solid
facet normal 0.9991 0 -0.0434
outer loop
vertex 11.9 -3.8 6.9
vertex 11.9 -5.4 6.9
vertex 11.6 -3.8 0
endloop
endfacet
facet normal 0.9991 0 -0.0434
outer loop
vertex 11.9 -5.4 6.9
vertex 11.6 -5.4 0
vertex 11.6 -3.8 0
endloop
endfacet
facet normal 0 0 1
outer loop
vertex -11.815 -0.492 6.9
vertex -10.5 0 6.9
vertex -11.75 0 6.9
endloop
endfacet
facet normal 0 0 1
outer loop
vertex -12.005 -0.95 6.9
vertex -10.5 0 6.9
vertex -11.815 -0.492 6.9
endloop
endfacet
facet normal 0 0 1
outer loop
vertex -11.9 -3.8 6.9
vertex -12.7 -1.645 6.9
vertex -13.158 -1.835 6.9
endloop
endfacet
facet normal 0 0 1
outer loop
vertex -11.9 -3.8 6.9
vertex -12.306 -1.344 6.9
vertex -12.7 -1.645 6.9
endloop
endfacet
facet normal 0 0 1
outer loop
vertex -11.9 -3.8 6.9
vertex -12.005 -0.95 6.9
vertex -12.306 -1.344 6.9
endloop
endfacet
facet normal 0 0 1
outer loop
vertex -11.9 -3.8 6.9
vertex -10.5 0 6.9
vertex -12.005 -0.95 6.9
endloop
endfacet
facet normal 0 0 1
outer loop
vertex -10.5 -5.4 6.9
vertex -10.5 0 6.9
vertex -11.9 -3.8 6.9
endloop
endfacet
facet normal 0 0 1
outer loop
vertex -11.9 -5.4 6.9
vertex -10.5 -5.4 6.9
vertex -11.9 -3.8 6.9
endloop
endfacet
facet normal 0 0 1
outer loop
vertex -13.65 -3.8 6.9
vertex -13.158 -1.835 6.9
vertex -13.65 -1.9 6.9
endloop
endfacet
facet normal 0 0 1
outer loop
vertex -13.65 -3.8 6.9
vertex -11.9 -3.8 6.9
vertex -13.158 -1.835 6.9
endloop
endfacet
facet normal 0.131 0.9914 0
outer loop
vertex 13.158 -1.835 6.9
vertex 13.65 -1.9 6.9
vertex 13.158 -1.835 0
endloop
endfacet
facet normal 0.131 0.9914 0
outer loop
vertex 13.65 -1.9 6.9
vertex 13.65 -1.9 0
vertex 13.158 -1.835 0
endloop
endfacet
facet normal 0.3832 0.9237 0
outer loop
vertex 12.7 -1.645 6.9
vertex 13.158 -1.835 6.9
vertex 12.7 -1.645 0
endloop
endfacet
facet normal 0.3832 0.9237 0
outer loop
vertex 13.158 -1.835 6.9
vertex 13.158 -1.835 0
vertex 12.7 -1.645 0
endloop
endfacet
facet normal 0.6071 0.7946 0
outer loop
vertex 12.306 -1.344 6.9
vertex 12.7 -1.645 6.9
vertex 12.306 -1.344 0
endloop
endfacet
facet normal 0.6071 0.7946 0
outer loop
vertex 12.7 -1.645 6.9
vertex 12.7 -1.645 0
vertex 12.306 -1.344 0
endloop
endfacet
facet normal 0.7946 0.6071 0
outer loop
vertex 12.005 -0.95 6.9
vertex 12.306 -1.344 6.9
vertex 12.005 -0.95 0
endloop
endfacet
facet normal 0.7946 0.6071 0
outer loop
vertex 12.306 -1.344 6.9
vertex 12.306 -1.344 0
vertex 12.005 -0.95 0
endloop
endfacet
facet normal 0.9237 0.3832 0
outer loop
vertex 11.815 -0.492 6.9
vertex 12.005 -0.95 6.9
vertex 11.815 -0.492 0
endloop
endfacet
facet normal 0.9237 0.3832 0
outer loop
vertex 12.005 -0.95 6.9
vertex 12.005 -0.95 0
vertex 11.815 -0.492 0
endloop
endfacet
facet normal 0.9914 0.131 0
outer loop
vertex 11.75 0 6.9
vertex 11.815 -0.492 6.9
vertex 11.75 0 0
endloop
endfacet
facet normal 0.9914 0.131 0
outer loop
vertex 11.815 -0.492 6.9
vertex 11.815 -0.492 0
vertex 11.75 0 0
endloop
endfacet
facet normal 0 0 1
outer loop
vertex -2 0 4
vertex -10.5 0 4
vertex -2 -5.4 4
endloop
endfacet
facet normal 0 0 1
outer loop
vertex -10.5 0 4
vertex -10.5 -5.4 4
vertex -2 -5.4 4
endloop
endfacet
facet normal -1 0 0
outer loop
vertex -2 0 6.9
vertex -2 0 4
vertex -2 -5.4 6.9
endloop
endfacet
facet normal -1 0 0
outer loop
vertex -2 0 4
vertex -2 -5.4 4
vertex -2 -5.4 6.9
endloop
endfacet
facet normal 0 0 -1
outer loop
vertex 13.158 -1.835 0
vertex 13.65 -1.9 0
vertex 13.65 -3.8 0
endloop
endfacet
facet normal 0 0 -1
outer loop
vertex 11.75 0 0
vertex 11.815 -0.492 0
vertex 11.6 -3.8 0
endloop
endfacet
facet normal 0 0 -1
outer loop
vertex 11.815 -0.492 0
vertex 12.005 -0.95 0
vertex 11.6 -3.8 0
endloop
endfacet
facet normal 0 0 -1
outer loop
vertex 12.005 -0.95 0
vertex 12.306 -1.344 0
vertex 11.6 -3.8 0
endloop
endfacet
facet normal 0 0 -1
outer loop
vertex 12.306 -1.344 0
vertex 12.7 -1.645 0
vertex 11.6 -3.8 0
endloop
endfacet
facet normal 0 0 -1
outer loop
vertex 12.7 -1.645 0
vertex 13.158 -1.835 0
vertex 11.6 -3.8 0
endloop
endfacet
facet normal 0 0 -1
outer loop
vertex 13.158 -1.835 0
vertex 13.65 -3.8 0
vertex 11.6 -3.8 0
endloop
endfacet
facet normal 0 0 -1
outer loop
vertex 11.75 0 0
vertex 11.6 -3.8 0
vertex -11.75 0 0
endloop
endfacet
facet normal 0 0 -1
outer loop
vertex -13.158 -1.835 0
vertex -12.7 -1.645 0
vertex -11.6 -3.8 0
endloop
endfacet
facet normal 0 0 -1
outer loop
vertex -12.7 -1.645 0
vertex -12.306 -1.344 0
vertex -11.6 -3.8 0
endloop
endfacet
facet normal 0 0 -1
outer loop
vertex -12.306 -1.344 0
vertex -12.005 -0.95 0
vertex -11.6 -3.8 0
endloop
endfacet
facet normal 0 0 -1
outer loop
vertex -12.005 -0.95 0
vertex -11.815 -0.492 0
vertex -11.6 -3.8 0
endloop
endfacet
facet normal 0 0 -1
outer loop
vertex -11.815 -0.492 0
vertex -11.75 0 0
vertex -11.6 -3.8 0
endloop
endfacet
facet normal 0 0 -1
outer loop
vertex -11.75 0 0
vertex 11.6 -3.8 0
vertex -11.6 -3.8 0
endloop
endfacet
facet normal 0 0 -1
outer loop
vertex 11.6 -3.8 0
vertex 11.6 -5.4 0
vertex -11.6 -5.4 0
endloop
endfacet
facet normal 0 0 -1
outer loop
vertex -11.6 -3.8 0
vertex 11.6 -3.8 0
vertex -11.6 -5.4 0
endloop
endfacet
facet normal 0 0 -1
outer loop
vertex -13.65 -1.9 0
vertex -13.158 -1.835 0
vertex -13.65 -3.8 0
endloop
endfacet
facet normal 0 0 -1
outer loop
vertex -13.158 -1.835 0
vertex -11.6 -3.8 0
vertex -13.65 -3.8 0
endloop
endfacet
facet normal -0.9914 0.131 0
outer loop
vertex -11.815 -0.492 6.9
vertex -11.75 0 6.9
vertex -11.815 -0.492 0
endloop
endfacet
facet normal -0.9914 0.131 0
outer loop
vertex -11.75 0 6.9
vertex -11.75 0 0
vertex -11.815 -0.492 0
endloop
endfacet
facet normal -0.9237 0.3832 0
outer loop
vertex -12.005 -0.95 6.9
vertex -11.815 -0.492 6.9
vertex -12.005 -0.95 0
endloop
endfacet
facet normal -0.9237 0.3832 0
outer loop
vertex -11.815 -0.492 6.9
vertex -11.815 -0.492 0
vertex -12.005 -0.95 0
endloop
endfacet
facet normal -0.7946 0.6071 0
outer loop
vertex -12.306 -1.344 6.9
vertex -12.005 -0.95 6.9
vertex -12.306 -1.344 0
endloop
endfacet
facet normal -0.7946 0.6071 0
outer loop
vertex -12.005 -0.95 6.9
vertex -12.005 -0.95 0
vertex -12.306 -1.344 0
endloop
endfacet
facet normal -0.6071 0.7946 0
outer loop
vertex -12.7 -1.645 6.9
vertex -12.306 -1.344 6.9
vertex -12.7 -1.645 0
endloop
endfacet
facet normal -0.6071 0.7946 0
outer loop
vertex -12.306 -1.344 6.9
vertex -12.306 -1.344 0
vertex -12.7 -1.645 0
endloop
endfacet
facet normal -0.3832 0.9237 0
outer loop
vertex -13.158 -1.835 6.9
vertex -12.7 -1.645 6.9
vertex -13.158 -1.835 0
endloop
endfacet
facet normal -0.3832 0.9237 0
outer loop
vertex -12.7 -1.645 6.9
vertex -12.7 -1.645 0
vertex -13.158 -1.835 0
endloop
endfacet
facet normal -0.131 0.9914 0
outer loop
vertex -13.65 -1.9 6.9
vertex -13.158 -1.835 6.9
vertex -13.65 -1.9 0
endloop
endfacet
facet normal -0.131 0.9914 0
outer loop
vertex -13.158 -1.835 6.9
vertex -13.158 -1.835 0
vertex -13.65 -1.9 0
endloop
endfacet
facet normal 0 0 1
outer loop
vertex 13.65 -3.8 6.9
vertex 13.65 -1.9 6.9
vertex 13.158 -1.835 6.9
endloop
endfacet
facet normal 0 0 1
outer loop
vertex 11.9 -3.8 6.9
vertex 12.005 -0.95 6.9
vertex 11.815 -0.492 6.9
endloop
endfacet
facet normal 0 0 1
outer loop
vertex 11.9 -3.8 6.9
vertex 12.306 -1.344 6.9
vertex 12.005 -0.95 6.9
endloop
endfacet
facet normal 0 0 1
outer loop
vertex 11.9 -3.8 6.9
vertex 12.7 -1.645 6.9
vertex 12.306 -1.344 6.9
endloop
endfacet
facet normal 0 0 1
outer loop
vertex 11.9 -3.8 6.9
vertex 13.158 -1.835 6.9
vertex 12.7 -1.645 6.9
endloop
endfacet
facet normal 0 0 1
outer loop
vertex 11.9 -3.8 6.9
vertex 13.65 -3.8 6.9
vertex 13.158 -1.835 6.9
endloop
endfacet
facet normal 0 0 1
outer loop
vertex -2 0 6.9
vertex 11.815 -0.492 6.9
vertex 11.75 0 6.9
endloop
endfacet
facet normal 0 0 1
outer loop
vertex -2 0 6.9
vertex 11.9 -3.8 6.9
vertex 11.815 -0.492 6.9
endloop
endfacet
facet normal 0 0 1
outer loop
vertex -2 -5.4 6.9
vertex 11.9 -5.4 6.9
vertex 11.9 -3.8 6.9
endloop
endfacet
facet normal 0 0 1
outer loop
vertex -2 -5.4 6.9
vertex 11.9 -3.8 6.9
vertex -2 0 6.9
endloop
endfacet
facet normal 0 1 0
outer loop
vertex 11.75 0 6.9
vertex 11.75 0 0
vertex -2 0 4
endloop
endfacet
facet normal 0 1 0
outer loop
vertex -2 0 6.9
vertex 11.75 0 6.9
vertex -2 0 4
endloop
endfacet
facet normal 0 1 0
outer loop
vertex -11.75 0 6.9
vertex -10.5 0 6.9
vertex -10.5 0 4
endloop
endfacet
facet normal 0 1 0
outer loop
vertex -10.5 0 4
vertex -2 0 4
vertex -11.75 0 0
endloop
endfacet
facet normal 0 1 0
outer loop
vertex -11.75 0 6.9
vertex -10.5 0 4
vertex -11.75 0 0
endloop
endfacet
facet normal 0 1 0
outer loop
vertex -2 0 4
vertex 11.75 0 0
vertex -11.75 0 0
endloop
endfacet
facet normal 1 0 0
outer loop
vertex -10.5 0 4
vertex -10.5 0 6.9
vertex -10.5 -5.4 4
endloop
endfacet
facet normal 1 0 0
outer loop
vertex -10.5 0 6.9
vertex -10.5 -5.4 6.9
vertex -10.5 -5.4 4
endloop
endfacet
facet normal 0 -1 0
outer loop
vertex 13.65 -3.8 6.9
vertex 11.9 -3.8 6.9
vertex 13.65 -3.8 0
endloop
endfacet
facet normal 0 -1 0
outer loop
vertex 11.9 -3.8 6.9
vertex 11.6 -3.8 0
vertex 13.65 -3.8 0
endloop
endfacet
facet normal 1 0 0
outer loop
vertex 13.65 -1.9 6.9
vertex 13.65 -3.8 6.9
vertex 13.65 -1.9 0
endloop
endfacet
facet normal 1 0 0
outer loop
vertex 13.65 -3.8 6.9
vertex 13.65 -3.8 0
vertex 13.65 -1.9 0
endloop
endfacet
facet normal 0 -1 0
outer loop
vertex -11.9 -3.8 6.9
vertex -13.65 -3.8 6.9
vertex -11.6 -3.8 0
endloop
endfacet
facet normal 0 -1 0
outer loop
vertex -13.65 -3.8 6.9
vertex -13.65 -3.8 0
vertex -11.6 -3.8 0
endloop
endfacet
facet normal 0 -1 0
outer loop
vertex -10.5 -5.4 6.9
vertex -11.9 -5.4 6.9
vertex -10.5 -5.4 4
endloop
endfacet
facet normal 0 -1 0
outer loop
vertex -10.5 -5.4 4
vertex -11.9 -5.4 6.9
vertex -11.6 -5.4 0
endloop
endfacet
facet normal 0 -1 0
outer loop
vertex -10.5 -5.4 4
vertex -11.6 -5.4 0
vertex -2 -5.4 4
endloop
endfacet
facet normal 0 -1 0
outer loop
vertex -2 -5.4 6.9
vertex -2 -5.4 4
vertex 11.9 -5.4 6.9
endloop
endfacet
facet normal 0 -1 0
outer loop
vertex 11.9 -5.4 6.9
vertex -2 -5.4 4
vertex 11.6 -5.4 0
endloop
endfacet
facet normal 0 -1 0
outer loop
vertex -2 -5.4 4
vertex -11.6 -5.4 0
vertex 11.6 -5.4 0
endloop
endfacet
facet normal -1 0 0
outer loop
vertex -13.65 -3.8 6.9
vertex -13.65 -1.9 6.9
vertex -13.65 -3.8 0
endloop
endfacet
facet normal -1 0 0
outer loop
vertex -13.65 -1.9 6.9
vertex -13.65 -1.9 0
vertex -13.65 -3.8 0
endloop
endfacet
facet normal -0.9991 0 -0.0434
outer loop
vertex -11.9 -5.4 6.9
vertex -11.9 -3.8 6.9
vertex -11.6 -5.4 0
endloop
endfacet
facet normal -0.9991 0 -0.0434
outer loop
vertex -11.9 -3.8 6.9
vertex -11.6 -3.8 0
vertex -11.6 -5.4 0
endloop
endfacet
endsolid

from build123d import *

# Parameters (mm, degrees)
SKETCH002_W = 8.5
SKETCH002_H = 2.9
SKETCH003_W = 8.5
SKETCH003_H = 2.9


with BuildPart() as part:
    # Sketch001 → AdditiveLoft section 0
    with BuildSketch(Plane.XY.offset(6.9)):
        with BuildLine():
            Line((-11.9, -5.4), (11.9, -5.4))
            Line((11.9, -5.4), (11.9, -3.8))
            Line((11.9, -3.8), (13.65, -3.8))
            Line((13.65, -3.8), (13.65, -1.9))
            ThreePointArc((11.75, 0), (12.306497, -1.343503), (13.65, -1.9))
            Line((-11.75, 0), (11.75, 0))
            ThreePointArc((-13.65, -1.9), (-12.306497, -1.343503), (-11.75, 0))
            Line((-13.65, -3.8), (-13.65, -1.9))
            Line((-11.9, -3.8), (-13.65, -3.8))
            Line((-11.9, -5.4), (-11.9, -3.8))
        make_face()
    # Sketch → AdditiveLoft section 1
    with BuildSketch(Plane.XY):
        with BuildLine():
            Line((-11.6, -5.4), (11.6, -5.4))
            Line((11.6, -5.4), (11.6, -3.8))
            Line((11.6, -3.8), (13.65, -3.8))
            Line((13.65, -3.8), (13.65, -1.9))
            ThreePointArc((11.75, 0), (12.306497, -1.343503), (13.65, -1.9))
            Line((-11.75, 0), (11.75, 0))
            ThreePointArc((-13.65, -1.9), (-12.306497, -1.343503), (-11.75, 0))
            Line((-13.65, -3.8), (-13.65, -1.9))
            Line((-11.6, -3.8), (-13.65, -3.8))
            Line((-11.6, -5.4), (-11.6, -3.8))
        make_face()
    loft()

    # Sketch002 → SubtractiveLoft section 0
    with BuildSketch(Plane.XZ):
        with Locations((-6.25, 5.45)):
            Rectangle(SKETCH002_W, SKETCH002_H)
    # Sketch003 → SubtractiveLoft section 1
    with BuildSketch(Plane.XZ.offset(5.4)):
        with Locations((-6.25, 5.45)):
            Rectangle(SKETCH003_W, SKETCH003_H)
    loft(mode=Mode.SUBTRACT)


solid = part.part
